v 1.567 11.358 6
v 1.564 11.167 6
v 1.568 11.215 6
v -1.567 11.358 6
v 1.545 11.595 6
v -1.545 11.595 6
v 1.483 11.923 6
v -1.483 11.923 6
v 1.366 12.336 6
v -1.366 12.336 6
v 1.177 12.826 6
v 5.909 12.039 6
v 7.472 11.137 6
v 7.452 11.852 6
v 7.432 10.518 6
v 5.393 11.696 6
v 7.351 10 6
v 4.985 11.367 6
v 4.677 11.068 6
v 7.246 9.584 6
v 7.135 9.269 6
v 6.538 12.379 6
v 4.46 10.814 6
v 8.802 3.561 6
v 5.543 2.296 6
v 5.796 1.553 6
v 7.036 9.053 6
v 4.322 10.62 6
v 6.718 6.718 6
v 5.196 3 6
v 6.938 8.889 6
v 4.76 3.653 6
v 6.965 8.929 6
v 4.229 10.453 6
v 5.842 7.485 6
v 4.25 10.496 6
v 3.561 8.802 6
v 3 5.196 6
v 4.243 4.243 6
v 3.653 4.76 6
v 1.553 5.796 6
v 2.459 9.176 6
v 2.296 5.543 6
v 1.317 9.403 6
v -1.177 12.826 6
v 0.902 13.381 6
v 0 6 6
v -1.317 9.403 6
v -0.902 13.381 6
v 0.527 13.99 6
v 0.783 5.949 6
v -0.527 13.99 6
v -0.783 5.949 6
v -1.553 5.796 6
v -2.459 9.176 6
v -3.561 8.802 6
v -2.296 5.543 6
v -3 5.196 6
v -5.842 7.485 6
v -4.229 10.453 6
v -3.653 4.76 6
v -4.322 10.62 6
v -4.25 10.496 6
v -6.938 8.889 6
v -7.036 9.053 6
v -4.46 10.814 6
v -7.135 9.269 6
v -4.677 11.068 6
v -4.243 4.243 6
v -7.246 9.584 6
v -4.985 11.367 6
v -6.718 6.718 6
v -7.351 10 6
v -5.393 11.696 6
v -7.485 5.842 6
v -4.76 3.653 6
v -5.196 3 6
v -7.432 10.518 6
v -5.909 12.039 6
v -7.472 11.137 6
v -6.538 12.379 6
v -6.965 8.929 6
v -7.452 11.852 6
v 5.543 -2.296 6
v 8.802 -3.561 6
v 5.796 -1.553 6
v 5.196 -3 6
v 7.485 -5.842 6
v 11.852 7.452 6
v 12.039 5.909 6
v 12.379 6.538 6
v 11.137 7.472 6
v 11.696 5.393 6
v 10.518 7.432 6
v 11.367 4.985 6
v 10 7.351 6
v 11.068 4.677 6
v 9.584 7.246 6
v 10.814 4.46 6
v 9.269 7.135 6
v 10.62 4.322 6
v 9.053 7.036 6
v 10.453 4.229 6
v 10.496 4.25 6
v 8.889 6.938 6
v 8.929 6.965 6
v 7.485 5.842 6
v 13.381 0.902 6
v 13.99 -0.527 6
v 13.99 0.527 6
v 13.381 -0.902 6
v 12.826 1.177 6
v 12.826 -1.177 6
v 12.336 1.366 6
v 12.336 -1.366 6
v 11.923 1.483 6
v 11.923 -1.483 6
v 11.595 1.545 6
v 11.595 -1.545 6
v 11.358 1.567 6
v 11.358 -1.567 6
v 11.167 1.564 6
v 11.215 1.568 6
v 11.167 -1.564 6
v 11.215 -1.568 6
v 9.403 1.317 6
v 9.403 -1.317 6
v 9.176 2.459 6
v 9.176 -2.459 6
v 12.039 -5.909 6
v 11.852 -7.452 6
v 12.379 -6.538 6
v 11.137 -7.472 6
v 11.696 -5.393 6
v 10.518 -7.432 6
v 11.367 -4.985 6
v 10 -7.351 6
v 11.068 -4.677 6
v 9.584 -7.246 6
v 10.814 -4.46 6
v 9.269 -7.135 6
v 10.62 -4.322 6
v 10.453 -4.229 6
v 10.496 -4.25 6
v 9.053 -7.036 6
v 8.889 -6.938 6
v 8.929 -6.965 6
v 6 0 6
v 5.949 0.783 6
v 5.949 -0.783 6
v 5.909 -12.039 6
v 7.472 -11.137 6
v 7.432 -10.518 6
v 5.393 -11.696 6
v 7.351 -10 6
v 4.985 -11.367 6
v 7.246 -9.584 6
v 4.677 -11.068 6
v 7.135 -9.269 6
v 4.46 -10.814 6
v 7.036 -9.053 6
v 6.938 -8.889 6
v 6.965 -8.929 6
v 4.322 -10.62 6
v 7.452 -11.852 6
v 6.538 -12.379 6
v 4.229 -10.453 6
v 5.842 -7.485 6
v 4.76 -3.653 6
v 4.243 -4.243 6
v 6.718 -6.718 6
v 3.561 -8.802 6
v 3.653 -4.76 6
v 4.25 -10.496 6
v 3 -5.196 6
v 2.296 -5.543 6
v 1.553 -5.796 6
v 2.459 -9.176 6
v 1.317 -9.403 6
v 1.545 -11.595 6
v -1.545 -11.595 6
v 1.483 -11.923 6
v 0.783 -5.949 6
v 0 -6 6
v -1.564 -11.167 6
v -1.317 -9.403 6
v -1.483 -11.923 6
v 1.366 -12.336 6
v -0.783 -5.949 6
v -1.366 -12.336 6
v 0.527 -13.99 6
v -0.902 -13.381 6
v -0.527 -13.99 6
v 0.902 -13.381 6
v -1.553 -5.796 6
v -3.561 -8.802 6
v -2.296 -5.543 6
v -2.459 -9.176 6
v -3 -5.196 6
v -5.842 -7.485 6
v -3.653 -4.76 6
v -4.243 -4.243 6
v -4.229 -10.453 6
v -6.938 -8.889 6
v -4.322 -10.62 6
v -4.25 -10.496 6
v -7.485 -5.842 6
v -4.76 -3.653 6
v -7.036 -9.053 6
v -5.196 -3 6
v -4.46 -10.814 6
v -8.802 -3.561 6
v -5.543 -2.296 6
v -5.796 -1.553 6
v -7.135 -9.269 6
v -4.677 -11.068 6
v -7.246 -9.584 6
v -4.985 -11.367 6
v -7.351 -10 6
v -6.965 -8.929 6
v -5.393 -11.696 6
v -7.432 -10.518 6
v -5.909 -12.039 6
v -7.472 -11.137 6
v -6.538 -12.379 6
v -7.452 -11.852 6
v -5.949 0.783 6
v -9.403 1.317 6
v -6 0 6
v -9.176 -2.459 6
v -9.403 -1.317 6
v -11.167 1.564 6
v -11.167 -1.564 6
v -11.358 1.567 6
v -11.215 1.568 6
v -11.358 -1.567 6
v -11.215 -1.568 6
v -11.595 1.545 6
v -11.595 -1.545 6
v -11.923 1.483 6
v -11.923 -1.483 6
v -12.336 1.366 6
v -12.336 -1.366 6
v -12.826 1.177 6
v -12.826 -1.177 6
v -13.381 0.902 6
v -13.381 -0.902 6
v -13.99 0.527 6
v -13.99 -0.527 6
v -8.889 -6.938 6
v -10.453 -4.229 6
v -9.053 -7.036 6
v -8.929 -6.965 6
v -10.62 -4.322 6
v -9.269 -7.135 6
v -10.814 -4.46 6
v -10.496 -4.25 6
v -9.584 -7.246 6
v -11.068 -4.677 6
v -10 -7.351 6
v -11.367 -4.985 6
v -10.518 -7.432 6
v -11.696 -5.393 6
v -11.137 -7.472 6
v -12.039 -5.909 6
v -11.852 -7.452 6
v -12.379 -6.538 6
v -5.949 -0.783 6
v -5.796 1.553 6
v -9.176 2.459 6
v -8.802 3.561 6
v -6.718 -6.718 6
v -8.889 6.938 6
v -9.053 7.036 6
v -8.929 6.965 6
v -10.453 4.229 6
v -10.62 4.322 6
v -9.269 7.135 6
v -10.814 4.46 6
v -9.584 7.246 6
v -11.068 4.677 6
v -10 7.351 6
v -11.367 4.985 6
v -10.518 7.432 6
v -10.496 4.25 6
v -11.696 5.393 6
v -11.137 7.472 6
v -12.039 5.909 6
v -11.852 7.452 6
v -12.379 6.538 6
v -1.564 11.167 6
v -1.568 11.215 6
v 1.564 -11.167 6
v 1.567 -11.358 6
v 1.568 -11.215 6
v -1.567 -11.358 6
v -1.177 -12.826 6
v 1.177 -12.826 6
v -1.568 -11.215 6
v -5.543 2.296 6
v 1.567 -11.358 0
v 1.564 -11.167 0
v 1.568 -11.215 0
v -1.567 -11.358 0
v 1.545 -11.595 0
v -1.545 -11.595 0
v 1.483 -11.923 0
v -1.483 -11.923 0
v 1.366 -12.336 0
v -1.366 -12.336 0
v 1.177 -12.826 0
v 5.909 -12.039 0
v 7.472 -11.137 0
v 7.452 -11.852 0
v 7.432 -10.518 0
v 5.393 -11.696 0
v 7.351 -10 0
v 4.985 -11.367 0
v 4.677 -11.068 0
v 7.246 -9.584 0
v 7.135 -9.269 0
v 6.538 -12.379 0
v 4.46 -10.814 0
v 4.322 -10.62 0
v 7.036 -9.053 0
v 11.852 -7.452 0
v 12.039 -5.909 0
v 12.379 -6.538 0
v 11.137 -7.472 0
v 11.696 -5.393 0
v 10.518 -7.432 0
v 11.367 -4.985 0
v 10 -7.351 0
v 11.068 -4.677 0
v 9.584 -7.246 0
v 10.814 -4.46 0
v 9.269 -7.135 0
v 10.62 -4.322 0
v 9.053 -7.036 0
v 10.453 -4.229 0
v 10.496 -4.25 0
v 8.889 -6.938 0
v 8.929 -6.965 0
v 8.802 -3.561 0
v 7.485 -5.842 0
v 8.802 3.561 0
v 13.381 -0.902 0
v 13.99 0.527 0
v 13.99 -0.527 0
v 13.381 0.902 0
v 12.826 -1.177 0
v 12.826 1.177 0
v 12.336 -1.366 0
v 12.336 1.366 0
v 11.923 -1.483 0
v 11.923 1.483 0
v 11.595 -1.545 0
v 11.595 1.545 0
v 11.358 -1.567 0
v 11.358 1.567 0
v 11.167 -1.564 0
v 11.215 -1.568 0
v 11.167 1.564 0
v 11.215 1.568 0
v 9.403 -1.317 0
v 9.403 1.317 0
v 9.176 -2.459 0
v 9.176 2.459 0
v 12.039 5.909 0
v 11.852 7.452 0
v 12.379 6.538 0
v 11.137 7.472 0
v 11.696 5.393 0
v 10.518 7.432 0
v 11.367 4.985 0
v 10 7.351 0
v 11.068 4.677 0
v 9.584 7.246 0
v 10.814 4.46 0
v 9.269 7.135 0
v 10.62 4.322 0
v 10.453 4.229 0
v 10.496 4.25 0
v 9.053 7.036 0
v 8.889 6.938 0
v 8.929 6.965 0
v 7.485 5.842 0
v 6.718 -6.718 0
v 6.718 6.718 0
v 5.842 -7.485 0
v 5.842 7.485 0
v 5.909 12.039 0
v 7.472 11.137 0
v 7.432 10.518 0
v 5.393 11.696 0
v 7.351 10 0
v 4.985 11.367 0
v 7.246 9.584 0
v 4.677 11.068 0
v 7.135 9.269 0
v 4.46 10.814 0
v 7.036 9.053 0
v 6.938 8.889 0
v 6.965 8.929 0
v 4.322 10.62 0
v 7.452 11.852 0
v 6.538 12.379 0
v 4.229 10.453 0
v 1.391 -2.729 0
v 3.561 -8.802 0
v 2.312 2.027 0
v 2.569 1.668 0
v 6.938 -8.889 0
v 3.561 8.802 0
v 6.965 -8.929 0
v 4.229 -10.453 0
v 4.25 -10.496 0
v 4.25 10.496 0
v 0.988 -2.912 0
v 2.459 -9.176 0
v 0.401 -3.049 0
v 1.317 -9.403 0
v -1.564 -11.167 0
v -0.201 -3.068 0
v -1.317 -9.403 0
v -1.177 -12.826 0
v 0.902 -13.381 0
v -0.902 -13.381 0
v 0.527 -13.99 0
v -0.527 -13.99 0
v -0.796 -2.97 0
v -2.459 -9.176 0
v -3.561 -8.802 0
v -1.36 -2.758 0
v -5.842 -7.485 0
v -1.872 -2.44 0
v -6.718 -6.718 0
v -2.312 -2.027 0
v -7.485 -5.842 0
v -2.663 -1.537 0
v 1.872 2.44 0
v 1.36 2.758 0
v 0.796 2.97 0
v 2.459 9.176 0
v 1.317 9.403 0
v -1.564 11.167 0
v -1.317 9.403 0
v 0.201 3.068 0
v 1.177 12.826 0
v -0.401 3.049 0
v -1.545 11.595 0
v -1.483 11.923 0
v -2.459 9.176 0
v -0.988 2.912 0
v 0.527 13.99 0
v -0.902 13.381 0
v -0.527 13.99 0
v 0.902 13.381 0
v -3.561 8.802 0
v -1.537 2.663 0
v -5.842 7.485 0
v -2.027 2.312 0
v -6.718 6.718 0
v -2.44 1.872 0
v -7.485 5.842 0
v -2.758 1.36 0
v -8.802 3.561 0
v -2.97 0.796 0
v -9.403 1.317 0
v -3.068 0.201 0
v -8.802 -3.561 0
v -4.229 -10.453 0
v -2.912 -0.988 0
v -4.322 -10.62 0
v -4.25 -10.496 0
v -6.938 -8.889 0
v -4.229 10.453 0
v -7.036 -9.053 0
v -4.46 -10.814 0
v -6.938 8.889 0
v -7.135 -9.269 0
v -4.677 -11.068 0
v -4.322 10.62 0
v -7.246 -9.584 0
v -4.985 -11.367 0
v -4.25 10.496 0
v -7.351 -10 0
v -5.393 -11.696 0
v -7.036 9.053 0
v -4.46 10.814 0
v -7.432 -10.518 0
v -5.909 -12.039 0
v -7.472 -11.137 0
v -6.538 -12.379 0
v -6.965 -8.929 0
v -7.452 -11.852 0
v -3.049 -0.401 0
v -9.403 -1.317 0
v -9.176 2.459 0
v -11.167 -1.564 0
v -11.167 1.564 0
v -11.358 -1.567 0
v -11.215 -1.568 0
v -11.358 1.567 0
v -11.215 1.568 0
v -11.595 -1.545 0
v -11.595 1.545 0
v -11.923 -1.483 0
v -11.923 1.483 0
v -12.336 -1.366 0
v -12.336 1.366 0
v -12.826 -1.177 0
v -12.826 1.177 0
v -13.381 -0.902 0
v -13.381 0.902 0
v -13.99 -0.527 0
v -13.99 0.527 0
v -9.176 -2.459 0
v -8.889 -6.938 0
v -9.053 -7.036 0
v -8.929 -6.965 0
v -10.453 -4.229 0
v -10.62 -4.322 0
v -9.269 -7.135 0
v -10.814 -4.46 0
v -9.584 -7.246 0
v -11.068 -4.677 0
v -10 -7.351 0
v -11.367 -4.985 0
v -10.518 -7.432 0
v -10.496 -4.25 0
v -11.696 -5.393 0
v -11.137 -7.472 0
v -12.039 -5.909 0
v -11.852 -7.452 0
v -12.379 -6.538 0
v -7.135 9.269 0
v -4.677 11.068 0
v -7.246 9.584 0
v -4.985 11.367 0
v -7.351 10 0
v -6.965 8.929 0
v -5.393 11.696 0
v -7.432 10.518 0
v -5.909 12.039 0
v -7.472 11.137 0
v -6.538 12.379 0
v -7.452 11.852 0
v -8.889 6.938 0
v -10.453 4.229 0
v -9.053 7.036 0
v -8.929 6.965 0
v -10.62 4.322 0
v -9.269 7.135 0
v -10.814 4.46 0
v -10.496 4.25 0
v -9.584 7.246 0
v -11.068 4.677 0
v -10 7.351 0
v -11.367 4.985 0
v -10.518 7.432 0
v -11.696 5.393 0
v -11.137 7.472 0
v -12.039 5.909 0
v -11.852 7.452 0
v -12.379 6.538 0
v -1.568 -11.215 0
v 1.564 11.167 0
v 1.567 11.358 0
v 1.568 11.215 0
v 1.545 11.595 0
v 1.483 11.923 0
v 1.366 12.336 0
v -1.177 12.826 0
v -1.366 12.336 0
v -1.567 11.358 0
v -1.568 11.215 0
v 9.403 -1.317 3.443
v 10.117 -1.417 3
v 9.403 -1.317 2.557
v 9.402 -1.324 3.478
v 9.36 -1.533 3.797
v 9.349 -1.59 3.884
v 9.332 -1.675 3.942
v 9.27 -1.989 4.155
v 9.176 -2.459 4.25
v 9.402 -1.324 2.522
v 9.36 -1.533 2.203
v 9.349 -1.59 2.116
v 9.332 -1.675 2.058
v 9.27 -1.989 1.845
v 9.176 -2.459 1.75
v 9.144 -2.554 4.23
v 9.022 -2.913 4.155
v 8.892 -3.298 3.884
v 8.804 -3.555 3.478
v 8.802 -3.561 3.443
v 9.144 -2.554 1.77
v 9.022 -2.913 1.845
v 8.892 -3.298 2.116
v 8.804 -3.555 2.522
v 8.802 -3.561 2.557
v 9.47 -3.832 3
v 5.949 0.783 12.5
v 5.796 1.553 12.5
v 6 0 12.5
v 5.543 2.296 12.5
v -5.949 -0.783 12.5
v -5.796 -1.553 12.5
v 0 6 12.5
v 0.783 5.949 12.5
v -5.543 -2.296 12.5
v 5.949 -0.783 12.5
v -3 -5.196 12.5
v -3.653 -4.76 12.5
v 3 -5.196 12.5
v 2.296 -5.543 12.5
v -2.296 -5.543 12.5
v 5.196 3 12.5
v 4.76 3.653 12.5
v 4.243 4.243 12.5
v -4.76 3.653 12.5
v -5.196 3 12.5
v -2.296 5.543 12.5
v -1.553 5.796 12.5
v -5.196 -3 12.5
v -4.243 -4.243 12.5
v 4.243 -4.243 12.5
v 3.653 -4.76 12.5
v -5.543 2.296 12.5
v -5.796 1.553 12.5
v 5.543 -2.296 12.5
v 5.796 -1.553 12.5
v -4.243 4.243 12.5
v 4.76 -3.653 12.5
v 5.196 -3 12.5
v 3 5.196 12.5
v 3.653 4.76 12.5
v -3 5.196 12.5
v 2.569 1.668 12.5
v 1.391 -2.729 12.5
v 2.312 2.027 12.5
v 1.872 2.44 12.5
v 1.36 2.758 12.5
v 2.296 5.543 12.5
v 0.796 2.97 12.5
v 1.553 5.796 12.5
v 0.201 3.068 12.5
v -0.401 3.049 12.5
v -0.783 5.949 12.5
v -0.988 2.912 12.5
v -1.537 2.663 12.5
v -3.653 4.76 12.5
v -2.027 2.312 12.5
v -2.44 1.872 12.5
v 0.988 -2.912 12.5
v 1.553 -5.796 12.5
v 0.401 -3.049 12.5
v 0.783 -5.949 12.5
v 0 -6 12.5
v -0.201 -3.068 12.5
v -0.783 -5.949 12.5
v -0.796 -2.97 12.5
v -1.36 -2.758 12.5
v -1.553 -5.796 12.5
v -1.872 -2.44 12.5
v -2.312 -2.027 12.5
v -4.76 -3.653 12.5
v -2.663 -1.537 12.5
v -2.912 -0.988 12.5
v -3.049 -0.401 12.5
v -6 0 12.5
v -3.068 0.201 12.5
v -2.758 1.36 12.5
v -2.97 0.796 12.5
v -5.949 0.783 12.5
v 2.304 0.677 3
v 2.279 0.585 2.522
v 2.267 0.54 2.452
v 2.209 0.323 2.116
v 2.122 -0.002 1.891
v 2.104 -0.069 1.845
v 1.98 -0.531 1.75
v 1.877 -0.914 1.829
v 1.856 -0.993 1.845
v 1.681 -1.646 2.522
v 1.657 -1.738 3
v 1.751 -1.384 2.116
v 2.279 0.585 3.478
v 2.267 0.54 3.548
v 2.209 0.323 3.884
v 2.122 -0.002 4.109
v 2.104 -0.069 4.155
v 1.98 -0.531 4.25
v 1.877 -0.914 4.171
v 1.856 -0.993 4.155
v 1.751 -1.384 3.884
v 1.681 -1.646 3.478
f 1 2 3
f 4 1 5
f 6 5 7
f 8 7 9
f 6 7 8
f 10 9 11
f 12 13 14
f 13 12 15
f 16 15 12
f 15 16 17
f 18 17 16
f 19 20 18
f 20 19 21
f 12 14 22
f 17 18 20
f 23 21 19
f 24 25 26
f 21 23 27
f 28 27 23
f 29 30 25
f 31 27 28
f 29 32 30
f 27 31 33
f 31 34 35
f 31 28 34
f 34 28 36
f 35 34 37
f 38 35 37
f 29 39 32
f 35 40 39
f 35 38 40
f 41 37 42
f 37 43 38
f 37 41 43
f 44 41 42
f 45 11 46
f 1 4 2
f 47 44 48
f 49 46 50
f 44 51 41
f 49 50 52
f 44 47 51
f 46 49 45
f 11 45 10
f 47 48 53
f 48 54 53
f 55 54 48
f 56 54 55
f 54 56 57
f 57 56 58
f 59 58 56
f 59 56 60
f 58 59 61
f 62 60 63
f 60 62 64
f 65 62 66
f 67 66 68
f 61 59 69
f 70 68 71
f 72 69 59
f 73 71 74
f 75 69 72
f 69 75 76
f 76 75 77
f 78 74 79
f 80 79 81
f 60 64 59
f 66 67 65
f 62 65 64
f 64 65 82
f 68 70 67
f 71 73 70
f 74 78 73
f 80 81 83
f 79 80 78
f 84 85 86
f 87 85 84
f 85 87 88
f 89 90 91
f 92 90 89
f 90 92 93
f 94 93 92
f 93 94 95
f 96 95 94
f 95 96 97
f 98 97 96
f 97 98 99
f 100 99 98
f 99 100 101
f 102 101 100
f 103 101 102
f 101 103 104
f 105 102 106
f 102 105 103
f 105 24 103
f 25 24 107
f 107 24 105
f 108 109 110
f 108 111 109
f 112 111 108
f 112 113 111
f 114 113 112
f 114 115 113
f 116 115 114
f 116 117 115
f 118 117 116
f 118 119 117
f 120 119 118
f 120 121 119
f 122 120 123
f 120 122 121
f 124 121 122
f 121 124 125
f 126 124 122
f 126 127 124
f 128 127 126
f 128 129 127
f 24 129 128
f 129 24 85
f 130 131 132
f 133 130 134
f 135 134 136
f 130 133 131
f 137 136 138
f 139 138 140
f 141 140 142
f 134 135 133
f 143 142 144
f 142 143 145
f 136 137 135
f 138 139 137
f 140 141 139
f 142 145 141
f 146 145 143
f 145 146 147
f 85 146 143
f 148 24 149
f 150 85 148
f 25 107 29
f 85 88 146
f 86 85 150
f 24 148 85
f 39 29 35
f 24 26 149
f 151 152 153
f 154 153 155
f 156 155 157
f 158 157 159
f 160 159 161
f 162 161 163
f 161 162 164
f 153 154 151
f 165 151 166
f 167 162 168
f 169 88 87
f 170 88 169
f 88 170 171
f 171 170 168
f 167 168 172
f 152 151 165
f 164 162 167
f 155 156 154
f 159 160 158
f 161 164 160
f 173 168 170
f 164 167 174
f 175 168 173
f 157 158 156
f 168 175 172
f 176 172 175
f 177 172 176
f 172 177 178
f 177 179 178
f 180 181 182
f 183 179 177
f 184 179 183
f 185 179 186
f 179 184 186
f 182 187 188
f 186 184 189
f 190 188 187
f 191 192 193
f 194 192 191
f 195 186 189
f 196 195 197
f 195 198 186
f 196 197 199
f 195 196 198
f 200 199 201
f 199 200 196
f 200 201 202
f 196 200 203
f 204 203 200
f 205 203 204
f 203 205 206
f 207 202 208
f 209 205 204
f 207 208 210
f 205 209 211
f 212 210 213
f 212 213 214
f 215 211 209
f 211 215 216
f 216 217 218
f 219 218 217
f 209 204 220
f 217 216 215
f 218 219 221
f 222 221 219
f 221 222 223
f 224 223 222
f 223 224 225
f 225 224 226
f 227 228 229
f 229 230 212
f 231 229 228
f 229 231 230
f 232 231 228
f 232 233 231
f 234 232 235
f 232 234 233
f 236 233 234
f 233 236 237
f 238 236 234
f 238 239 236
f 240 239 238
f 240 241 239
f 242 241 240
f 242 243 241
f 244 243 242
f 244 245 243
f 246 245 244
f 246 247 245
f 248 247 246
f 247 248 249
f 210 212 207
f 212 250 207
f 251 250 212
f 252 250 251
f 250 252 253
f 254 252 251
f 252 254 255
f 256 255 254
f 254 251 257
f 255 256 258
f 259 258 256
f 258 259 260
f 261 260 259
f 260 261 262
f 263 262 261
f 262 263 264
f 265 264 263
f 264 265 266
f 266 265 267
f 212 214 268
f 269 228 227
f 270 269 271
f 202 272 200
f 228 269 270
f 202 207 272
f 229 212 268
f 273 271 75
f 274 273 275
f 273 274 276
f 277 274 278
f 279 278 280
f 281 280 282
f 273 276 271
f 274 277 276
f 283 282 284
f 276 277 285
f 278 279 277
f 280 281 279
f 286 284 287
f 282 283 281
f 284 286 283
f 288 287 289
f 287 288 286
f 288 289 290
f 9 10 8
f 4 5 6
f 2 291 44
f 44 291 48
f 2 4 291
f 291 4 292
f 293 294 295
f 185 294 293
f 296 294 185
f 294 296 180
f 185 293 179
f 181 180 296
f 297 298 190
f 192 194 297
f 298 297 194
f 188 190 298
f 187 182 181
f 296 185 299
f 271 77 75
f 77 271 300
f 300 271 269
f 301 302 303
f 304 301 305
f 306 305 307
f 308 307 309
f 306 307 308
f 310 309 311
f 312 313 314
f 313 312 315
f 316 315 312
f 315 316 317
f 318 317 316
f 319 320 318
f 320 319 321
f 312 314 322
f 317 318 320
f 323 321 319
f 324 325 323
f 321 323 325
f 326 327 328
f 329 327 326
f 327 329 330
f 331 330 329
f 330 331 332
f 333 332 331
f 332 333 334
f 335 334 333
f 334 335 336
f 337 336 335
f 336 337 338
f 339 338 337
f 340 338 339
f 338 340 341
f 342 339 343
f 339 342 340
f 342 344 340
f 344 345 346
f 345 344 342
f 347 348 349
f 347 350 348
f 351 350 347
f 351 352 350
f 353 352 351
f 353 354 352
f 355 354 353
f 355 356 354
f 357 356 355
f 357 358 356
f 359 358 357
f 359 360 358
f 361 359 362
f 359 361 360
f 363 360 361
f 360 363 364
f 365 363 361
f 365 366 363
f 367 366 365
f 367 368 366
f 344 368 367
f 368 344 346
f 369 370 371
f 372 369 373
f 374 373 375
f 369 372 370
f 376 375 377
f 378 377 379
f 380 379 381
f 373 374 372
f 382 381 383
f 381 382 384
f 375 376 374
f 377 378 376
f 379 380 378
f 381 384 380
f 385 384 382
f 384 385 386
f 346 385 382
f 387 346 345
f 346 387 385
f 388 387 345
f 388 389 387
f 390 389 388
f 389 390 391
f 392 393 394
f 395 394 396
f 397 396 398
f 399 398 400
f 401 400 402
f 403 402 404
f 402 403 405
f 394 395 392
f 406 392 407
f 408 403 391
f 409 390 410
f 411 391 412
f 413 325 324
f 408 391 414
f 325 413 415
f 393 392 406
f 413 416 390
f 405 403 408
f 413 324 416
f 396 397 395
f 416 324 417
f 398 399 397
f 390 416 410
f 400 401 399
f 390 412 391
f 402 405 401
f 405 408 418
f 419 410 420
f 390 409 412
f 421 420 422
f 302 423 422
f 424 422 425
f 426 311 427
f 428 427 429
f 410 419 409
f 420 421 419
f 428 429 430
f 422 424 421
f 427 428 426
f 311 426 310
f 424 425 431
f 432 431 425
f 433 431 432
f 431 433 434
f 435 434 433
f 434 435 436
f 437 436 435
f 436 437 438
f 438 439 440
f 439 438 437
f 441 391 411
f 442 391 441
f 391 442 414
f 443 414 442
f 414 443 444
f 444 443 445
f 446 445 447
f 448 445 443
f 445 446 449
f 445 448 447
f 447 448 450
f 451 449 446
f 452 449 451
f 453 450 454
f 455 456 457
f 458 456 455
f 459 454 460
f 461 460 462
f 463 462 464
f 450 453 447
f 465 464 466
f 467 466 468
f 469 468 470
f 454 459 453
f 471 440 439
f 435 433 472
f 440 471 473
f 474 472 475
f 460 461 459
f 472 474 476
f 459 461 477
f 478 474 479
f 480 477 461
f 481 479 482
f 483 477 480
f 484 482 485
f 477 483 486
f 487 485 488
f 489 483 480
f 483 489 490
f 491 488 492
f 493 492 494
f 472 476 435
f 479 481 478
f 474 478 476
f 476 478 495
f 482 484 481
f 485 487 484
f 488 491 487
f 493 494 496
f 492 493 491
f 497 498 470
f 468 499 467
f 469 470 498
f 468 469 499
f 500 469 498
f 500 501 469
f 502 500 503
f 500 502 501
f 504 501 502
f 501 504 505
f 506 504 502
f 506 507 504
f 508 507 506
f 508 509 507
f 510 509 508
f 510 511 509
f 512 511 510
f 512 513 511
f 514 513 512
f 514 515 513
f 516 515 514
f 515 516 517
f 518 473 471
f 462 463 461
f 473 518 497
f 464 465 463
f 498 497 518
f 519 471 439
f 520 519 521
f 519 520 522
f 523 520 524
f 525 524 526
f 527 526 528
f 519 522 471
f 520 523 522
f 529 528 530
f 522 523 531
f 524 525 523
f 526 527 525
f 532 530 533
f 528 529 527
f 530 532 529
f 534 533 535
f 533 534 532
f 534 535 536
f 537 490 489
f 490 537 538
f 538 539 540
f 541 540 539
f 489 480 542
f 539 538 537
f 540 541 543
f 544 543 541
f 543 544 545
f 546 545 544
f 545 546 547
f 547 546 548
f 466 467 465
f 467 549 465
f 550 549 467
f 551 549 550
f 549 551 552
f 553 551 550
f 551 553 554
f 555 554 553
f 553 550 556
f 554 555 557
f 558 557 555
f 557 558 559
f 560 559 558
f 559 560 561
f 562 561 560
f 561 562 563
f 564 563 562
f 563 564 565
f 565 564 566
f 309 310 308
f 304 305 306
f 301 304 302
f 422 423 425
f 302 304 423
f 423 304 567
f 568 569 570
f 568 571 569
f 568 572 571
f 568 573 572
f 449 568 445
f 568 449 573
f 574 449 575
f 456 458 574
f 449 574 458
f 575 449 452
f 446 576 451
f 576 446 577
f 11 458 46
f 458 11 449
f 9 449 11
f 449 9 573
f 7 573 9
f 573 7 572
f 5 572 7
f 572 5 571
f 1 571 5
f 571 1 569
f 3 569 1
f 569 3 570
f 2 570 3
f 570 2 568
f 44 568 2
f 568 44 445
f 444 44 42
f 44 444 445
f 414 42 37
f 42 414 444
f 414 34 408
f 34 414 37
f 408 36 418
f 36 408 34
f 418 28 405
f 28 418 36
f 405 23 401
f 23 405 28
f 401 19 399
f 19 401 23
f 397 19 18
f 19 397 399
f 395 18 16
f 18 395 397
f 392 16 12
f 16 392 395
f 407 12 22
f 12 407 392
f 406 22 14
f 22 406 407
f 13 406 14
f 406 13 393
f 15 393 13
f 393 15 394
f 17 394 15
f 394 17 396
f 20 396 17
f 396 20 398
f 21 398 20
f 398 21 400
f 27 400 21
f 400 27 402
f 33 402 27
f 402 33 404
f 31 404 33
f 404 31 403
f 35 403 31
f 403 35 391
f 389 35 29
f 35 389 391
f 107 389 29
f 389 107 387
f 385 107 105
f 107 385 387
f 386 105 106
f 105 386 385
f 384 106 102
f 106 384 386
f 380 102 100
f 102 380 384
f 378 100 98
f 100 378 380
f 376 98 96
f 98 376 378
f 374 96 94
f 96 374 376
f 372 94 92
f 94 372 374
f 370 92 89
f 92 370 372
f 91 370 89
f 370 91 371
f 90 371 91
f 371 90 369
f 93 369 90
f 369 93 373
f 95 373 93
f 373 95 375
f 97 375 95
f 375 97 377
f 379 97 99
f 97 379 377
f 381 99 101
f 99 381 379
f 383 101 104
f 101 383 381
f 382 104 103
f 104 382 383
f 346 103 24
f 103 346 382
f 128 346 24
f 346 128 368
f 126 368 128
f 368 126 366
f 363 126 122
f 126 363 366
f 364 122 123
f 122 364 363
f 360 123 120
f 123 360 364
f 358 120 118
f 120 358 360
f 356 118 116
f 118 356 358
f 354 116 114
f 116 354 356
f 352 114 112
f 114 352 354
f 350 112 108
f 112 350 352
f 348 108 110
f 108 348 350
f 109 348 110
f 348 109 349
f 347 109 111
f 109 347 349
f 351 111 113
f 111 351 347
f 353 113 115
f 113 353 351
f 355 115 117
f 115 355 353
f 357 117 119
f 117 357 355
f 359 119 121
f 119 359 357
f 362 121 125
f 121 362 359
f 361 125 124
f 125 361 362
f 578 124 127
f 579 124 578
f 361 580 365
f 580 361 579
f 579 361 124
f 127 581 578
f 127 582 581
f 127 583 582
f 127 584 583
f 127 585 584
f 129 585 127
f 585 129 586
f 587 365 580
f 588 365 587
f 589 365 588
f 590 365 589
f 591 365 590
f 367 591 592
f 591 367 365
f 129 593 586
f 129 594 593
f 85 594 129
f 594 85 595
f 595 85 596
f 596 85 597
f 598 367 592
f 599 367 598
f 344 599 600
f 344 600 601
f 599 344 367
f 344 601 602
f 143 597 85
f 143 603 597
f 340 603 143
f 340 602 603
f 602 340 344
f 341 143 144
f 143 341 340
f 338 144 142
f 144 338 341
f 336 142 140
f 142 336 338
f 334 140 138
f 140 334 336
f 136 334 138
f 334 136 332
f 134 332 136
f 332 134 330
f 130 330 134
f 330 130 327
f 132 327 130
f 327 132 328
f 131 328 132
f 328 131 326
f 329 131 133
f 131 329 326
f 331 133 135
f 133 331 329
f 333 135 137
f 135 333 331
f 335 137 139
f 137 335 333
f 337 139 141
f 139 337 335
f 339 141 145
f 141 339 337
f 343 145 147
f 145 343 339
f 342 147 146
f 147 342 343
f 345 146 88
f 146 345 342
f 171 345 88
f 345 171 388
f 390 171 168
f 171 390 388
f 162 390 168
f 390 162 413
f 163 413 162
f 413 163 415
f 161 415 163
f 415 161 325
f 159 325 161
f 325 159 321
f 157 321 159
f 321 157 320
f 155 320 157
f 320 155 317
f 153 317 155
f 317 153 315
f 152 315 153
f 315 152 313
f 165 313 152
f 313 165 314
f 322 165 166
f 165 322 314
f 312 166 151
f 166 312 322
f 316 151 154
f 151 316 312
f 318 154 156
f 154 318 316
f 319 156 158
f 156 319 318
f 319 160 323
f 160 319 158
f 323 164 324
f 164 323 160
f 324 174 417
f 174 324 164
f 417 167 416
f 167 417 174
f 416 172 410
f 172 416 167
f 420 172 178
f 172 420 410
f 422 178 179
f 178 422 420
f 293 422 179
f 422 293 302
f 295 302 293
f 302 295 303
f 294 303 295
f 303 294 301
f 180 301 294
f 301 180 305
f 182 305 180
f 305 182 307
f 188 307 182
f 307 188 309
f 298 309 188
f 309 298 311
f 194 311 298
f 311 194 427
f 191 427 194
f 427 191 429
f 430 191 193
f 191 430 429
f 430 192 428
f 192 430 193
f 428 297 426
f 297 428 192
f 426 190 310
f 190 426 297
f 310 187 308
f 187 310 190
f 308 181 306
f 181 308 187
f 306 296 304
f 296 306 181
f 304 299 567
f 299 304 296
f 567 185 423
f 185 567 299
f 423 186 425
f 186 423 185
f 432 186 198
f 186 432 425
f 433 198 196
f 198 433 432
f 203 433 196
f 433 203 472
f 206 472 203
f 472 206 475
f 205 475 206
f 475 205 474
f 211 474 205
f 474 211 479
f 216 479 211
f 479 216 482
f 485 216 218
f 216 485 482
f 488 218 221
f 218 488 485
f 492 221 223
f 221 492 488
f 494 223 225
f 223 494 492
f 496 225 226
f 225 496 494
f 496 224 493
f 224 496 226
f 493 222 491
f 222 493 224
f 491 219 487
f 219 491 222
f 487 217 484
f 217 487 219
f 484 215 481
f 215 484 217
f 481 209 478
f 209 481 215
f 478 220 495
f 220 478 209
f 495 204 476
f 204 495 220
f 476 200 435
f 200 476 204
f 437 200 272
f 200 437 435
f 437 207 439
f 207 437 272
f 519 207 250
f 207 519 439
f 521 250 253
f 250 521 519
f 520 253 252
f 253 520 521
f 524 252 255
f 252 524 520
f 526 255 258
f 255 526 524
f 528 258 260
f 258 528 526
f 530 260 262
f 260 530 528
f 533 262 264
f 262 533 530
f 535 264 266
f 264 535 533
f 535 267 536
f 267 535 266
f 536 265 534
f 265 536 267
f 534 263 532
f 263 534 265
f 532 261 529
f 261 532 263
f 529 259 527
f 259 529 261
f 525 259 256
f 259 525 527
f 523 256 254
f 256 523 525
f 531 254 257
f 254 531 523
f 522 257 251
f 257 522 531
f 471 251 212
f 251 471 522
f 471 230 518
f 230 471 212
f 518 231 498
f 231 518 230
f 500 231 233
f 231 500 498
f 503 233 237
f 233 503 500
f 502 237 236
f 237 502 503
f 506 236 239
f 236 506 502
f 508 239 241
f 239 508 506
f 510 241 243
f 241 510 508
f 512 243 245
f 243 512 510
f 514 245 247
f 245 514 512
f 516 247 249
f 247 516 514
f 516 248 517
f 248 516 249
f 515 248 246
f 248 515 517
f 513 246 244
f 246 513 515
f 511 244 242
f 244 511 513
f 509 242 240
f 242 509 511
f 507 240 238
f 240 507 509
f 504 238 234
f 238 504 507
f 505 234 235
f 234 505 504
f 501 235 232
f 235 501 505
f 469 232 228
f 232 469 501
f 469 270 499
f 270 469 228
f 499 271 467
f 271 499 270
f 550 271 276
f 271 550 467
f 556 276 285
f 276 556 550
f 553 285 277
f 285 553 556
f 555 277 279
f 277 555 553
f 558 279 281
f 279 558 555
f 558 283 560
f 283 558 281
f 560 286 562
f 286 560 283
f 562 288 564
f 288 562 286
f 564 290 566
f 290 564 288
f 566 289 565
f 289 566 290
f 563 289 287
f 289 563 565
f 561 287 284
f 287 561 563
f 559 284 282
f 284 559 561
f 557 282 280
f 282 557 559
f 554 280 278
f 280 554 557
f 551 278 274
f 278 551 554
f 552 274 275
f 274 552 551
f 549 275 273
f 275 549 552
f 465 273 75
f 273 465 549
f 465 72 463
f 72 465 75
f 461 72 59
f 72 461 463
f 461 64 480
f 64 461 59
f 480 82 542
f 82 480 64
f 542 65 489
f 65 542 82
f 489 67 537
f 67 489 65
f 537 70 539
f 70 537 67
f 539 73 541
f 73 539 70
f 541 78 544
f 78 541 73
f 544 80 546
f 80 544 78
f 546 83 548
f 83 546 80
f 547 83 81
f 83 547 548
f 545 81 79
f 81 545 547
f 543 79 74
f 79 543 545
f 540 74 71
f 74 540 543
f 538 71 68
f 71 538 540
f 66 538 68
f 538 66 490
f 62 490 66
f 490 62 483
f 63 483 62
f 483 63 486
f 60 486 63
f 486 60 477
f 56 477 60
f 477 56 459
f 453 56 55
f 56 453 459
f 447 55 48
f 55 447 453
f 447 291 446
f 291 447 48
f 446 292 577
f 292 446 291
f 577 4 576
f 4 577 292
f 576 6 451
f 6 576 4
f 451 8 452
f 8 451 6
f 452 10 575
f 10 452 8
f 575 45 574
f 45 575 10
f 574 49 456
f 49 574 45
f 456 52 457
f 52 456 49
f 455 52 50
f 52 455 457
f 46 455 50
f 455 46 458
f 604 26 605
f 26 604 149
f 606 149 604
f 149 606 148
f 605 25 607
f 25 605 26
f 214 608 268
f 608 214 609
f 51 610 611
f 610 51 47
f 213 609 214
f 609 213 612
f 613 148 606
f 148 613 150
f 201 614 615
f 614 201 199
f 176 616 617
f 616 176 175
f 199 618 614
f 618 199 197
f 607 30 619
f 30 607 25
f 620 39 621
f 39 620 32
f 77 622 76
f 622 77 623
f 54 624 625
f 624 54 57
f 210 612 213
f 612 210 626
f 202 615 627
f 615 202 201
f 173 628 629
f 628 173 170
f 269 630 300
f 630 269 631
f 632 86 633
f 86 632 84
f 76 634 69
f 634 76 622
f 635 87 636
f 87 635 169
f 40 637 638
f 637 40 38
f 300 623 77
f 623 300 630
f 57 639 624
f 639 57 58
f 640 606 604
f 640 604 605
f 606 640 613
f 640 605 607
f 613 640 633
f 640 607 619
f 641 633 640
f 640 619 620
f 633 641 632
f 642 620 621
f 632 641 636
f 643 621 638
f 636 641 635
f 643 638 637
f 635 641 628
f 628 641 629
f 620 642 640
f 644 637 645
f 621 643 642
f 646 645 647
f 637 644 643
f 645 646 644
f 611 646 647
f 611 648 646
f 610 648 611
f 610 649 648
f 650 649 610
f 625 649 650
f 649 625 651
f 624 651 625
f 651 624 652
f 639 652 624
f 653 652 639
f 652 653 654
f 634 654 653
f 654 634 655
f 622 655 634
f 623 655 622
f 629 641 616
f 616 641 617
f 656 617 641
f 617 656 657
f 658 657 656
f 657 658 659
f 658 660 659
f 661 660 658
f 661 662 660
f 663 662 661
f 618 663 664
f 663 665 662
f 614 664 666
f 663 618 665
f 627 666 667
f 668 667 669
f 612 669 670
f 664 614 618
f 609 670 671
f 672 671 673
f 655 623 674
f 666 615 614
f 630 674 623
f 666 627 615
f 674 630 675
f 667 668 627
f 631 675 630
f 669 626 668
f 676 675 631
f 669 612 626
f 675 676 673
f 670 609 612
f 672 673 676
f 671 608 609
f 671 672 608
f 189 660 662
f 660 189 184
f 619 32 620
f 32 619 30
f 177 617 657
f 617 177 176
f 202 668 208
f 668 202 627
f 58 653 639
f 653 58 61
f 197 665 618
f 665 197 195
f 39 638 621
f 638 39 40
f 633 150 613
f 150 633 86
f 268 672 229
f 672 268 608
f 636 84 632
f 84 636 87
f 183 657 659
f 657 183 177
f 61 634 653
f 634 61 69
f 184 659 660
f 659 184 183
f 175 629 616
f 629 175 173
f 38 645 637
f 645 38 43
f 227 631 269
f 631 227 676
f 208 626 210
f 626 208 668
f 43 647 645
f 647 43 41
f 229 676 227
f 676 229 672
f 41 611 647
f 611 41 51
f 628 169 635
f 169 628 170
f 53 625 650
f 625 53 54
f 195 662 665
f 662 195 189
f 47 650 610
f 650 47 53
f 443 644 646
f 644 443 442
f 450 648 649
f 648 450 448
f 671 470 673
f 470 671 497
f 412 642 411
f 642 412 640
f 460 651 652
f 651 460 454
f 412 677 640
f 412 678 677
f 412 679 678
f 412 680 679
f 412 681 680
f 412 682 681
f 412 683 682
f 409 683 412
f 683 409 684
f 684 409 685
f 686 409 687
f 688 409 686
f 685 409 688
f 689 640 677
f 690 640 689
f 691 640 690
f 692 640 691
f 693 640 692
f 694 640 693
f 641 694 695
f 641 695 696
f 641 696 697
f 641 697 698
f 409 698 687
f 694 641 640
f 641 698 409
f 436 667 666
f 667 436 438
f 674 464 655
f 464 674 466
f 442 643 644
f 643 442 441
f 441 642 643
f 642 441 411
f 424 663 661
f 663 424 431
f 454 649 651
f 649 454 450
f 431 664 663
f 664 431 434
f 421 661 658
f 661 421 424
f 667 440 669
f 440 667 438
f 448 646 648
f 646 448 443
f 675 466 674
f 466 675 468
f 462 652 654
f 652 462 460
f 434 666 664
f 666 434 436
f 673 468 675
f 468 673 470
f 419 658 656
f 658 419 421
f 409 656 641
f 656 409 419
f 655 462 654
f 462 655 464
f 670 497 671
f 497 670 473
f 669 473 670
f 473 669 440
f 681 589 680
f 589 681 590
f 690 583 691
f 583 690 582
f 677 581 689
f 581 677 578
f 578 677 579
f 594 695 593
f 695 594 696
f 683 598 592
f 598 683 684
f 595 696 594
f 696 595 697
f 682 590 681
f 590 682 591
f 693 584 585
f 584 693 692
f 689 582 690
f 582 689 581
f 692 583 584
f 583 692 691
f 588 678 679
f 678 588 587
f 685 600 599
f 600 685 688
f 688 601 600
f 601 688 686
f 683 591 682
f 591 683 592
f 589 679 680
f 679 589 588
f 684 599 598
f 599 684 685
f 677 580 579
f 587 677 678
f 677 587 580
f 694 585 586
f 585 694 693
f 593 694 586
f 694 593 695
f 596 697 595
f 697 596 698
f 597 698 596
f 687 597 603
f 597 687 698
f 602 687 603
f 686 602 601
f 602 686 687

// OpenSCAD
include <../lib/meshtastic-drybag-node-lib.scad>;
$fn = 40;
pinion_print();
